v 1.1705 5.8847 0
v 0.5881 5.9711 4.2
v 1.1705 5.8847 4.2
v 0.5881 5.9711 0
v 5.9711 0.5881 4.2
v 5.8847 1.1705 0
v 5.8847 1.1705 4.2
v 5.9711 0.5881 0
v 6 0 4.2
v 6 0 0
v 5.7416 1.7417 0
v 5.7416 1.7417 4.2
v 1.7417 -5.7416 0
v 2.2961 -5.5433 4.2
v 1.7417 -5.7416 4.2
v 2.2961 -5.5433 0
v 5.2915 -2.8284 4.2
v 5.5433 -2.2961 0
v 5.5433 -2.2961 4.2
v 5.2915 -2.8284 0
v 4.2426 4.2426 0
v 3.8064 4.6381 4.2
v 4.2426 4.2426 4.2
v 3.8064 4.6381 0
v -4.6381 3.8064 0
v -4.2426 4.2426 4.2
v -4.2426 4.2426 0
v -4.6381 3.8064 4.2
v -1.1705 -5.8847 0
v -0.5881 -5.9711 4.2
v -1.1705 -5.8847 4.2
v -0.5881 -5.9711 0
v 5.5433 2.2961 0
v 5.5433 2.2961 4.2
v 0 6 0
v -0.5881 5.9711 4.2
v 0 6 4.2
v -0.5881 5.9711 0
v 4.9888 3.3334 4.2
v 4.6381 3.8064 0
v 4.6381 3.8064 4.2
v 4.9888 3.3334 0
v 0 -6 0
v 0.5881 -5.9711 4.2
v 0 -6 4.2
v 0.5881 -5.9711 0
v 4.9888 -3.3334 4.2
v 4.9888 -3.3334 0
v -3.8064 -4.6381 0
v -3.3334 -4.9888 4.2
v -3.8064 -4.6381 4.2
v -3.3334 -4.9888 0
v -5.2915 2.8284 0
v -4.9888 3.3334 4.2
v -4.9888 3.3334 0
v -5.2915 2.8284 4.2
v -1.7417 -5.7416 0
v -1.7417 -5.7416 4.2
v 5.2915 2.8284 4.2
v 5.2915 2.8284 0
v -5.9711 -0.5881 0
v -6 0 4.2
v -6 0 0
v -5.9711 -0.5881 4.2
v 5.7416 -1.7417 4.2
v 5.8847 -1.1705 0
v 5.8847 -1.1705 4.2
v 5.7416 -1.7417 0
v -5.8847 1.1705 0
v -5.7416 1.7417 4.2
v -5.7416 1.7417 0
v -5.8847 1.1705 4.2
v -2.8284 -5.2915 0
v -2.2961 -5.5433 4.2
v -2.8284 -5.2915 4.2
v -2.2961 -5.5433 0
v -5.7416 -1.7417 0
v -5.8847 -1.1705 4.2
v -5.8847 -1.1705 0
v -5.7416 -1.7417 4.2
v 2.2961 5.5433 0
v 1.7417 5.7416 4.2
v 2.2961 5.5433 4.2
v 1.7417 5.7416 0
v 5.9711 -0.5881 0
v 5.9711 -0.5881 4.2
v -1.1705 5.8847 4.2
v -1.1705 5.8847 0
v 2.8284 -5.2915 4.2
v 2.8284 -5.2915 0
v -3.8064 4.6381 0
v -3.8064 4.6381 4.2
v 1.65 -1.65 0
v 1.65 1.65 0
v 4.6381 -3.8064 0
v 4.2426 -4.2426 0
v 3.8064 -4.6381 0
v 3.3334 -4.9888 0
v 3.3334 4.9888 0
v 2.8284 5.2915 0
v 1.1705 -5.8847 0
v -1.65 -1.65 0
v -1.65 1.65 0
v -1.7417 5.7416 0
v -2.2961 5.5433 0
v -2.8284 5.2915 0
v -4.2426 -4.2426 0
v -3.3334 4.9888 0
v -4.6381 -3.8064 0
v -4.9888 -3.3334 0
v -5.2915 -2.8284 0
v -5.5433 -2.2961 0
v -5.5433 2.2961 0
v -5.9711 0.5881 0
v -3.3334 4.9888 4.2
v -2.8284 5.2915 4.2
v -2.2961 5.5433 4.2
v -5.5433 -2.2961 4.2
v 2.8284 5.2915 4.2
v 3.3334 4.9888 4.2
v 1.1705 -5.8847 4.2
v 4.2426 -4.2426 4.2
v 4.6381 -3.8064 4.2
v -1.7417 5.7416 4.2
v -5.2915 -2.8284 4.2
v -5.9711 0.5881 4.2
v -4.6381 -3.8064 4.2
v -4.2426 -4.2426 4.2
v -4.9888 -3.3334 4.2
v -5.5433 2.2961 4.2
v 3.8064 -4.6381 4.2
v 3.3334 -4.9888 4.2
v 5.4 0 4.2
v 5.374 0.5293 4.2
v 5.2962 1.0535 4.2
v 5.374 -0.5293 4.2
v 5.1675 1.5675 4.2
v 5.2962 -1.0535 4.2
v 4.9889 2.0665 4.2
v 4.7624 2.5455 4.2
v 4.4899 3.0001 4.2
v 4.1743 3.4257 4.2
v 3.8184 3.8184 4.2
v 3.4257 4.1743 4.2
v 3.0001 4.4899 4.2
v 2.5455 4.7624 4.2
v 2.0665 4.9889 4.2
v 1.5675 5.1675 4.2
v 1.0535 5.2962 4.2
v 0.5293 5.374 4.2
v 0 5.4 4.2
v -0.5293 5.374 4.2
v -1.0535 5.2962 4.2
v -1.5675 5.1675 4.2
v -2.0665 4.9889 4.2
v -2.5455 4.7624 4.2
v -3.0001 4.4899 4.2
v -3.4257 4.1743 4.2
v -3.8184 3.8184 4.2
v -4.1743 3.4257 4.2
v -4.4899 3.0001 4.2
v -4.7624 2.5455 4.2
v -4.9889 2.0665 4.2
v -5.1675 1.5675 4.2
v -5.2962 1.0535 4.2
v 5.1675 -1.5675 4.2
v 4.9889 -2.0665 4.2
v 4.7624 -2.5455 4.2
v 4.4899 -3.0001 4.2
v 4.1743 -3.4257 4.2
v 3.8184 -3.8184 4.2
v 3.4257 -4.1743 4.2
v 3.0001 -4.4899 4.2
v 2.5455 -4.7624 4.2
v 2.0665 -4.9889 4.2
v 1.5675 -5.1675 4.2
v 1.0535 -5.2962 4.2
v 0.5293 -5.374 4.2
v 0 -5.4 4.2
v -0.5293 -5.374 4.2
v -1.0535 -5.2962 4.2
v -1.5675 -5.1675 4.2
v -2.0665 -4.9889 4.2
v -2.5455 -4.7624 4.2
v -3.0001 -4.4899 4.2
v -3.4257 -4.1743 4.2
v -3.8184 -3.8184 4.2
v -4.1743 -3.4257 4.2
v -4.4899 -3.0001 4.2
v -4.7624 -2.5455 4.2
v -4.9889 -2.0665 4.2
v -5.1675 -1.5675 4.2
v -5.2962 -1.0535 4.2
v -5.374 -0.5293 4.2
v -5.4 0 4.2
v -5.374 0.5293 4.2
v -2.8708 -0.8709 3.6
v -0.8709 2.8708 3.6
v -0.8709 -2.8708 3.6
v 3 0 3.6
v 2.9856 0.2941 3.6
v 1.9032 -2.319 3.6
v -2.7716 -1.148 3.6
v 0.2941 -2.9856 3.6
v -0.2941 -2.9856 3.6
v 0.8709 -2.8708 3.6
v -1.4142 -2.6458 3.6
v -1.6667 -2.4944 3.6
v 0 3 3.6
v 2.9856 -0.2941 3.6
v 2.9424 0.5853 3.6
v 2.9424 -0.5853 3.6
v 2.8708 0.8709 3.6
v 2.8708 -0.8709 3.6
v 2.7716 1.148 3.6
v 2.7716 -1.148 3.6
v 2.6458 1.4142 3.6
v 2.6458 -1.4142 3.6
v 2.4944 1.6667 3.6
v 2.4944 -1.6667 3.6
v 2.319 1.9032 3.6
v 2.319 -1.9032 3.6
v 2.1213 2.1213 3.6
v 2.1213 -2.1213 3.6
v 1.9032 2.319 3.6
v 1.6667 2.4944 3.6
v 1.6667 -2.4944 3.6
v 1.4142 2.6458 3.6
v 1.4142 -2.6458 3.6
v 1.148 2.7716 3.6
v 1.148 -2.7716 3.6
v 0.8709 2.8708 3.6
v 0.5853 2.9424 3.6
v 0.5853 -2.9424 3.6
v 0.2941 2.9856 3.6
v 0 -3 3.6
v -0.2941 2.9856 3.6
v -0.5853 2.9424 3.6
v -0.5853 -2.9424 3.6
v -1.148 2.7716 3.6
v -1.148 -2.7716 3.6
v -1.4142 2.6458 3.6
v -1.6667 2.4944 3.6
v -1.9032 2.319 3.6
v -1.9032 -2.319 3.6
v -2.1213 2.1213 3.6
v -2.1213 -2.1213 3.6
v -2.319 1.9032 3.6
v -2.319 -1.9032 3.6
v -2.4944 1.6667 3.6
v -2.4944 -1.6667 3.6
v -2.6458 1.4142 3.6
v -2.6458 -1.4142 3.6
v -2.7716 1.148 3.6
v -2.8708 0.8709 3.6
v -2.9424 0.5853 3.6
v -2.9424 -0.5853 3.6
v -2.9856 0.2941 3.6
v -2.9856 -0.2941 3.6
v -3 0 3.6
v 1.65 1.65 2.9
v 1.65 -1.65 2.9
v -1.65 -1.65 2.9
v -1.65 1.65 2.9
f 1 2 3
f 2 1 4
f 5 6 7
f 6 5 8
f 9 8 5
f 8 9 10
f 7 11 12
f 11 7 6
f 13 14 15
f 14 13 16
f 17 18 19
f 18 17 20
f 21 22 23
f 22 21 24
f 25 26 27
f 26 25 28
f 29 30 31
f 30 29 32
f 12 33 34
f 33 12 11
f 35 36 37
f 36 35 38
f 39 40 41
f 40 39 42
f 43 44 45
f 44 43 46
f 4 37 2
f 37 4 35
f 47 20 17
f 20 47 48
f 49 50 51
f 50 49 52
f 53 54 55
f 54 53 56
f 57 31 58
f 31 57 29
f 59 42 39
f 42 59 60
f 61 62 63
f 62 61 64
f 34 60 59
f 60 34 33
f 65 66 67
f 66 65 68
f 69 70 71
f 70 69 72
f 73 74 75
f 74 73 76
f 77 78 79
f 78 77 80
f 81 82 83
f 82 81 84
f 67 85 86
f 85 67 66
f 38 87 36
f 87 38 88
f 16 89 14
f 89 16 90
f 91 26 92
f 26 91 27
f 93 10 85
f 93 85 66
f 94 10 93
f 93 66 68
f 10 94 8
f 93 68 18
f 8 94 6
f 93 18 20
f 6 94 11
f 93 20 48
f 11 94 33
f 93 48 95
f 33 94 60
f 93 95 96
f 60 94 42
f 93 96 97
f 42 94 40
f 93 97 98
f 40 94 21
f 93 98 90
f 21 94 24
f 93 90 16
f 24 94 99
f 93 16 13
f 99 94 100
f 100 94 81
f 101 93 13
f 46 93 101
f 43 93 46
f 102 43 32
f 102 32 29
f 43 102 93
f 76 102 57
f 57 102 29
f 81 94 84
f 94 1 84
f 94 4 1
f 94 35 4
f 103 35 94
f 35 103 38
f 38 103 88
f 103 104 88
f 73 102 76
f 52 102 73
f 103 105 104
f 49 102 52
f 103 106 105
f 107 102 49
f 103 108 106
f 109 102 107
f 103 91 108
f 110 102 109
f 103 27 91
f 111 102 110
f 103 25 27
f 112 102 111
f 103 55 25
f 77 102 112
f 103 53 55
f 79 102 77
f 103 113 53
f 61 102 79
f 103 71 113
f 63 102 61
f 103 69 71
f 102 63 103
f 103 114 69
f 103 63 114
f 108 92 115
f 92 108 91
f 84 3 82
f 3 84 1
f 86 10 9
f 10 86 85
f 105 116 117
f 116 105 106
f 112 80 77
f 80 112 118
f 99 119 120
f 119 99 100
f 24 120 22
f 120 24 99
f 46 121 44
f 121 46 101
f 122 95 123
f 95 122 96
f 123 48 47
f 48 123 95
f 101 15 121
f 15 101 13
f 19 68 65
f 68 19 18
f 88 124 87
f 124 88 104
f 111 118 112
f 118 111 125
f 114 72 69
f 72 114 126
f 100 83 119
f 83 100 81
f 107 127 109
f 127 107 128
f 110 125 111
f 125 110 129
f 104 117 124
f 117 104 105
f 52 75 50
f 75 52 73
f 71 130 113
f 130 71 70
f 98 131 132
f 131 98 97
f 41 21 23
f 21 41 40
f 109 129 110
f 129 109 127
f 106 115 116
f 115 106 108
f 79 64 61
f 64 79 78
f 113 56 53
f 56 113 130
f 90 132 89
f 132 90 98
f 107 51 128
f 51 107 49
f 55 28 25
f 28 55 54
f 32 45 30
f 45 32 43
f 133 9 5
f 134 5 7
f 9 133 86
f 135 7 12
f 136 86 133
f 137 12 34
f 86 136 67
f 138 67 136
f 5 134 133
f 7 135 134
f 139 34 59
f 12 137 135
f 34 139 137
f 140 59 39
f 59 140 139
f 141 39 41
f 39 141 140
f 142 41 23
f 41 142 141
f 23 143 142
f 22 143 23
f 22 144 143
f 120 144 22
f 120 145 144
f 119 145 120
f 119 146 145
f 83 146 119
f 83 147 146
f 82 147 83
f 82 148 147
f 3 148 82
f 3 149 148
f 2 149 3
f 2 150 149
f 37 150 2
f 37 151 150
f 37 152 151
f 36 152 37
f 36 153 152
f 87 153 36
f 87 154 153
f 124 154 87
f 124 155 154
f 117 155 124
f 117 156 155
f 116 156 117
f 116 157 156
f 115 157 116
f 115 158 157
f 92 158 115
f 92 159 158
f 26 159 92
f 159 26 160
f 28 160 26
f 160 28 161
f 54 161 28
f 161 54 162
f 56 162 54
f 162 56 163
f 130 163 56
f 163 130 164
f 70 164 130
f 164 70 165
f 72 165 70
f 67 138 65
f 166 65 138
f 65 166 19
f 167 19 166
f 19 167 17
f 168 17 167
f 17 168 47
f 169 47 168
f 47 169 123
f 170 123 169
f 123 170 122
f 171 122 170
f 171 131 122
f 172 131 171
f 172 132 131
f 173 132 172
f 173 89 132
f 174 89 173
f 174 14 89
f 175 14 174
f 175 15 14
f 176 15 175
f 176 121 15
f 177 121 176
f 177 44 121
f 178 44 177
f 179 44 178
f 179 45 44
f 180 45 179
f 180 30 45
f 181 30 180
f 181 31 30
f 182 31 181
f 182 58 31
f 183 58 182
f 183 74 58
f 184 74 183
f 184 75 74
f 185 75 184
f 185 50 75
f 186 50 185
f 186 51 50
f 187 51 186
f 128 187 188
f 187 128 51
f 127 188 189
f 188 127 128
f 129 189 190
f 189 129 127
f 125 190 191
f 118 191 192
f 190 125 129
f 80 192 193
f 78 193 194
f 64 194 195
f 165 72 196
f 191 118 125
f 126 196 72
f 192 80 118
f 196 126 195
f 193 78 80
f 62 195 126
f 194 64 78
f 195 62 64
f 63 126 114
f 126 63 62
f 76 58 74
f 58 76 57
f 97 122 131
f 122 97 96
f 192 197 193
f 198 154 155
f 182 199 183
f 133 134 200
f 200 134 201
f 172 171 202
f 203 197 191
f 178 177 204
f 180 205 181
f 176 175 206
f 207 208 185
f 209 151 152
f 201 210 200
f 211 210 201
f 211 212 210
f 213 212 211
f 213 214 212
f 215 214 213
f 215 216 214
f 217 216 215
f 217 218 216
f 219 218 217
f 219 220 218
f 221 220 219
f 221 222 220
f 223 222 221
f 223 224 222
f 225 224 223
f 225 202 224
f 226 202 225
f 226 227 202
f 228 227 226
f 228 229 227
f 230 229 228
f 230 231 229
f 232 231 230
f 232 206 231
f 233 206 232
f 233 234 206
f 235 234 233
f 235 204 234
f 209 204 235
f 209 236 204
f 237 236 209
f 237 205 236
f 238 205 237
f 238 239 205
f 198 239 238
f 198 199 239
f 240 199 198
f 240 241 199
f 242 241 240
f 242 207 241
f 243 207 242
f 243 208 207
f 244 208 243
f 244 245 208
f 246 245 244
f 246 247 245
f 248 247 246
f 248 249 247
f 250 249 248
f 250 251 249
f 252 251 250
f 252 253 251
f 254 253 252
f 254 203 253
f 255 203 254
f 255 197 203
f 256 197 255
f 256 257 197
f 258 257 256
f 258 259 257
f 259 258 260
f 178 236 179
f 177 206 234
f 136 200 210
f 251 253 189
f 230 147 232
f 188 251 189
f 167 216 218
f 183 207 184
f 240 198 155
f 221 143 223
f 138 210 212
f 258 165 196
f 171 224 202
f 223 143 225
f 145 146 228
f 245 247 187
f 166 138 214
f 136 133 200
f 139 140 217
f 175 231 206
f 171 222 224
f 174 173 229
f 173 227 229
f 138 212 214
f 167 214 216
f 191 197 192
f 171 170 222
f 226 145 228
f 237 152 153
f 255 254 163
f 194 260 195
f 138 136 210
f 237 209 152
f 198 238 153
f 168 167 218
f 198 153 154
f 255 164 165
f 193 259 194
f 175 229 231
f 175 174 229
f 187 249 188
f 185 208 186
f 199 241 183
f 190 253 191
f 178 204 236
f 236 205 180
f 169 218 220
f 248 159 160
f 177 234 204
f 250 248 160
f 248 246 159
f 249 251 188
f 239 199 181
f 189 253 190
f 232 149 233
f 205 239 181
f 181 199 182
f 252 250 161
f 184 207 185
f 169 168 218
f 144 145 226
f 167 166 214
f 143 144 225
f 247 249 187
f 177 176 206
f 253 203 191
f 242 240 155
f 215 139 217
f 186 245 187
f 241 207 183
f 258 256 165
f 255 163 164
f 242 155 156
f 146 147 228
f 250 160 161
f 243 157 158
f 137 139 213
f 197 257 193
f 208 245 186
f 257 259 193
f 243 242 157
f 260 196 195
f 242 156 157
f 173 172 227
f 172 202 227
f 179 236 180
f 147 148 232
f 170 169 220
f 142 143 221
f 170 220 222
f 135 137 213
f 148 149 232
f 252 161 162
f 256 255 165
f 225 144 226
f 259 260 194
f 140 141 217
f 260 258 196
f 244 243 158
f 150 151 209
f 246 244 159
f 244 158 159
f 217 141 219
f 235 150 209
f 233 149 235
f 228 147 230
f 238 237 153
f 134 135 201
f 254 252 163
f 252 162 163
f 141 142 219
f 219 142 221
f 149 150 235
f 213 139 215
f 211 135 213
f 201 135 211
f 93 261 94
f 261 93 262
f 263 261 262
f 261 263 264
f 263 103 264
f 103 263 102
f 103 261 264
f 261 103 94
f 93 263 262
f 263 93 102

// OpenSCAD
$fn = 64;
h1 = 4.2;
r1 = 6;
w2 = 3.3;
h2 = 2.5;
h3 = 0.6;
difference() {
    cylinder(h=h1, r=r1);
    translate([0, 0, h1 - h3])
        cylinder(h=h3, r1=r1 / 2, r2=r1 * 0.9);
    translate([-w2 / 2, -w2 / 2, 0])
        cube([w2, w2, h2 + 0.4]);
}
